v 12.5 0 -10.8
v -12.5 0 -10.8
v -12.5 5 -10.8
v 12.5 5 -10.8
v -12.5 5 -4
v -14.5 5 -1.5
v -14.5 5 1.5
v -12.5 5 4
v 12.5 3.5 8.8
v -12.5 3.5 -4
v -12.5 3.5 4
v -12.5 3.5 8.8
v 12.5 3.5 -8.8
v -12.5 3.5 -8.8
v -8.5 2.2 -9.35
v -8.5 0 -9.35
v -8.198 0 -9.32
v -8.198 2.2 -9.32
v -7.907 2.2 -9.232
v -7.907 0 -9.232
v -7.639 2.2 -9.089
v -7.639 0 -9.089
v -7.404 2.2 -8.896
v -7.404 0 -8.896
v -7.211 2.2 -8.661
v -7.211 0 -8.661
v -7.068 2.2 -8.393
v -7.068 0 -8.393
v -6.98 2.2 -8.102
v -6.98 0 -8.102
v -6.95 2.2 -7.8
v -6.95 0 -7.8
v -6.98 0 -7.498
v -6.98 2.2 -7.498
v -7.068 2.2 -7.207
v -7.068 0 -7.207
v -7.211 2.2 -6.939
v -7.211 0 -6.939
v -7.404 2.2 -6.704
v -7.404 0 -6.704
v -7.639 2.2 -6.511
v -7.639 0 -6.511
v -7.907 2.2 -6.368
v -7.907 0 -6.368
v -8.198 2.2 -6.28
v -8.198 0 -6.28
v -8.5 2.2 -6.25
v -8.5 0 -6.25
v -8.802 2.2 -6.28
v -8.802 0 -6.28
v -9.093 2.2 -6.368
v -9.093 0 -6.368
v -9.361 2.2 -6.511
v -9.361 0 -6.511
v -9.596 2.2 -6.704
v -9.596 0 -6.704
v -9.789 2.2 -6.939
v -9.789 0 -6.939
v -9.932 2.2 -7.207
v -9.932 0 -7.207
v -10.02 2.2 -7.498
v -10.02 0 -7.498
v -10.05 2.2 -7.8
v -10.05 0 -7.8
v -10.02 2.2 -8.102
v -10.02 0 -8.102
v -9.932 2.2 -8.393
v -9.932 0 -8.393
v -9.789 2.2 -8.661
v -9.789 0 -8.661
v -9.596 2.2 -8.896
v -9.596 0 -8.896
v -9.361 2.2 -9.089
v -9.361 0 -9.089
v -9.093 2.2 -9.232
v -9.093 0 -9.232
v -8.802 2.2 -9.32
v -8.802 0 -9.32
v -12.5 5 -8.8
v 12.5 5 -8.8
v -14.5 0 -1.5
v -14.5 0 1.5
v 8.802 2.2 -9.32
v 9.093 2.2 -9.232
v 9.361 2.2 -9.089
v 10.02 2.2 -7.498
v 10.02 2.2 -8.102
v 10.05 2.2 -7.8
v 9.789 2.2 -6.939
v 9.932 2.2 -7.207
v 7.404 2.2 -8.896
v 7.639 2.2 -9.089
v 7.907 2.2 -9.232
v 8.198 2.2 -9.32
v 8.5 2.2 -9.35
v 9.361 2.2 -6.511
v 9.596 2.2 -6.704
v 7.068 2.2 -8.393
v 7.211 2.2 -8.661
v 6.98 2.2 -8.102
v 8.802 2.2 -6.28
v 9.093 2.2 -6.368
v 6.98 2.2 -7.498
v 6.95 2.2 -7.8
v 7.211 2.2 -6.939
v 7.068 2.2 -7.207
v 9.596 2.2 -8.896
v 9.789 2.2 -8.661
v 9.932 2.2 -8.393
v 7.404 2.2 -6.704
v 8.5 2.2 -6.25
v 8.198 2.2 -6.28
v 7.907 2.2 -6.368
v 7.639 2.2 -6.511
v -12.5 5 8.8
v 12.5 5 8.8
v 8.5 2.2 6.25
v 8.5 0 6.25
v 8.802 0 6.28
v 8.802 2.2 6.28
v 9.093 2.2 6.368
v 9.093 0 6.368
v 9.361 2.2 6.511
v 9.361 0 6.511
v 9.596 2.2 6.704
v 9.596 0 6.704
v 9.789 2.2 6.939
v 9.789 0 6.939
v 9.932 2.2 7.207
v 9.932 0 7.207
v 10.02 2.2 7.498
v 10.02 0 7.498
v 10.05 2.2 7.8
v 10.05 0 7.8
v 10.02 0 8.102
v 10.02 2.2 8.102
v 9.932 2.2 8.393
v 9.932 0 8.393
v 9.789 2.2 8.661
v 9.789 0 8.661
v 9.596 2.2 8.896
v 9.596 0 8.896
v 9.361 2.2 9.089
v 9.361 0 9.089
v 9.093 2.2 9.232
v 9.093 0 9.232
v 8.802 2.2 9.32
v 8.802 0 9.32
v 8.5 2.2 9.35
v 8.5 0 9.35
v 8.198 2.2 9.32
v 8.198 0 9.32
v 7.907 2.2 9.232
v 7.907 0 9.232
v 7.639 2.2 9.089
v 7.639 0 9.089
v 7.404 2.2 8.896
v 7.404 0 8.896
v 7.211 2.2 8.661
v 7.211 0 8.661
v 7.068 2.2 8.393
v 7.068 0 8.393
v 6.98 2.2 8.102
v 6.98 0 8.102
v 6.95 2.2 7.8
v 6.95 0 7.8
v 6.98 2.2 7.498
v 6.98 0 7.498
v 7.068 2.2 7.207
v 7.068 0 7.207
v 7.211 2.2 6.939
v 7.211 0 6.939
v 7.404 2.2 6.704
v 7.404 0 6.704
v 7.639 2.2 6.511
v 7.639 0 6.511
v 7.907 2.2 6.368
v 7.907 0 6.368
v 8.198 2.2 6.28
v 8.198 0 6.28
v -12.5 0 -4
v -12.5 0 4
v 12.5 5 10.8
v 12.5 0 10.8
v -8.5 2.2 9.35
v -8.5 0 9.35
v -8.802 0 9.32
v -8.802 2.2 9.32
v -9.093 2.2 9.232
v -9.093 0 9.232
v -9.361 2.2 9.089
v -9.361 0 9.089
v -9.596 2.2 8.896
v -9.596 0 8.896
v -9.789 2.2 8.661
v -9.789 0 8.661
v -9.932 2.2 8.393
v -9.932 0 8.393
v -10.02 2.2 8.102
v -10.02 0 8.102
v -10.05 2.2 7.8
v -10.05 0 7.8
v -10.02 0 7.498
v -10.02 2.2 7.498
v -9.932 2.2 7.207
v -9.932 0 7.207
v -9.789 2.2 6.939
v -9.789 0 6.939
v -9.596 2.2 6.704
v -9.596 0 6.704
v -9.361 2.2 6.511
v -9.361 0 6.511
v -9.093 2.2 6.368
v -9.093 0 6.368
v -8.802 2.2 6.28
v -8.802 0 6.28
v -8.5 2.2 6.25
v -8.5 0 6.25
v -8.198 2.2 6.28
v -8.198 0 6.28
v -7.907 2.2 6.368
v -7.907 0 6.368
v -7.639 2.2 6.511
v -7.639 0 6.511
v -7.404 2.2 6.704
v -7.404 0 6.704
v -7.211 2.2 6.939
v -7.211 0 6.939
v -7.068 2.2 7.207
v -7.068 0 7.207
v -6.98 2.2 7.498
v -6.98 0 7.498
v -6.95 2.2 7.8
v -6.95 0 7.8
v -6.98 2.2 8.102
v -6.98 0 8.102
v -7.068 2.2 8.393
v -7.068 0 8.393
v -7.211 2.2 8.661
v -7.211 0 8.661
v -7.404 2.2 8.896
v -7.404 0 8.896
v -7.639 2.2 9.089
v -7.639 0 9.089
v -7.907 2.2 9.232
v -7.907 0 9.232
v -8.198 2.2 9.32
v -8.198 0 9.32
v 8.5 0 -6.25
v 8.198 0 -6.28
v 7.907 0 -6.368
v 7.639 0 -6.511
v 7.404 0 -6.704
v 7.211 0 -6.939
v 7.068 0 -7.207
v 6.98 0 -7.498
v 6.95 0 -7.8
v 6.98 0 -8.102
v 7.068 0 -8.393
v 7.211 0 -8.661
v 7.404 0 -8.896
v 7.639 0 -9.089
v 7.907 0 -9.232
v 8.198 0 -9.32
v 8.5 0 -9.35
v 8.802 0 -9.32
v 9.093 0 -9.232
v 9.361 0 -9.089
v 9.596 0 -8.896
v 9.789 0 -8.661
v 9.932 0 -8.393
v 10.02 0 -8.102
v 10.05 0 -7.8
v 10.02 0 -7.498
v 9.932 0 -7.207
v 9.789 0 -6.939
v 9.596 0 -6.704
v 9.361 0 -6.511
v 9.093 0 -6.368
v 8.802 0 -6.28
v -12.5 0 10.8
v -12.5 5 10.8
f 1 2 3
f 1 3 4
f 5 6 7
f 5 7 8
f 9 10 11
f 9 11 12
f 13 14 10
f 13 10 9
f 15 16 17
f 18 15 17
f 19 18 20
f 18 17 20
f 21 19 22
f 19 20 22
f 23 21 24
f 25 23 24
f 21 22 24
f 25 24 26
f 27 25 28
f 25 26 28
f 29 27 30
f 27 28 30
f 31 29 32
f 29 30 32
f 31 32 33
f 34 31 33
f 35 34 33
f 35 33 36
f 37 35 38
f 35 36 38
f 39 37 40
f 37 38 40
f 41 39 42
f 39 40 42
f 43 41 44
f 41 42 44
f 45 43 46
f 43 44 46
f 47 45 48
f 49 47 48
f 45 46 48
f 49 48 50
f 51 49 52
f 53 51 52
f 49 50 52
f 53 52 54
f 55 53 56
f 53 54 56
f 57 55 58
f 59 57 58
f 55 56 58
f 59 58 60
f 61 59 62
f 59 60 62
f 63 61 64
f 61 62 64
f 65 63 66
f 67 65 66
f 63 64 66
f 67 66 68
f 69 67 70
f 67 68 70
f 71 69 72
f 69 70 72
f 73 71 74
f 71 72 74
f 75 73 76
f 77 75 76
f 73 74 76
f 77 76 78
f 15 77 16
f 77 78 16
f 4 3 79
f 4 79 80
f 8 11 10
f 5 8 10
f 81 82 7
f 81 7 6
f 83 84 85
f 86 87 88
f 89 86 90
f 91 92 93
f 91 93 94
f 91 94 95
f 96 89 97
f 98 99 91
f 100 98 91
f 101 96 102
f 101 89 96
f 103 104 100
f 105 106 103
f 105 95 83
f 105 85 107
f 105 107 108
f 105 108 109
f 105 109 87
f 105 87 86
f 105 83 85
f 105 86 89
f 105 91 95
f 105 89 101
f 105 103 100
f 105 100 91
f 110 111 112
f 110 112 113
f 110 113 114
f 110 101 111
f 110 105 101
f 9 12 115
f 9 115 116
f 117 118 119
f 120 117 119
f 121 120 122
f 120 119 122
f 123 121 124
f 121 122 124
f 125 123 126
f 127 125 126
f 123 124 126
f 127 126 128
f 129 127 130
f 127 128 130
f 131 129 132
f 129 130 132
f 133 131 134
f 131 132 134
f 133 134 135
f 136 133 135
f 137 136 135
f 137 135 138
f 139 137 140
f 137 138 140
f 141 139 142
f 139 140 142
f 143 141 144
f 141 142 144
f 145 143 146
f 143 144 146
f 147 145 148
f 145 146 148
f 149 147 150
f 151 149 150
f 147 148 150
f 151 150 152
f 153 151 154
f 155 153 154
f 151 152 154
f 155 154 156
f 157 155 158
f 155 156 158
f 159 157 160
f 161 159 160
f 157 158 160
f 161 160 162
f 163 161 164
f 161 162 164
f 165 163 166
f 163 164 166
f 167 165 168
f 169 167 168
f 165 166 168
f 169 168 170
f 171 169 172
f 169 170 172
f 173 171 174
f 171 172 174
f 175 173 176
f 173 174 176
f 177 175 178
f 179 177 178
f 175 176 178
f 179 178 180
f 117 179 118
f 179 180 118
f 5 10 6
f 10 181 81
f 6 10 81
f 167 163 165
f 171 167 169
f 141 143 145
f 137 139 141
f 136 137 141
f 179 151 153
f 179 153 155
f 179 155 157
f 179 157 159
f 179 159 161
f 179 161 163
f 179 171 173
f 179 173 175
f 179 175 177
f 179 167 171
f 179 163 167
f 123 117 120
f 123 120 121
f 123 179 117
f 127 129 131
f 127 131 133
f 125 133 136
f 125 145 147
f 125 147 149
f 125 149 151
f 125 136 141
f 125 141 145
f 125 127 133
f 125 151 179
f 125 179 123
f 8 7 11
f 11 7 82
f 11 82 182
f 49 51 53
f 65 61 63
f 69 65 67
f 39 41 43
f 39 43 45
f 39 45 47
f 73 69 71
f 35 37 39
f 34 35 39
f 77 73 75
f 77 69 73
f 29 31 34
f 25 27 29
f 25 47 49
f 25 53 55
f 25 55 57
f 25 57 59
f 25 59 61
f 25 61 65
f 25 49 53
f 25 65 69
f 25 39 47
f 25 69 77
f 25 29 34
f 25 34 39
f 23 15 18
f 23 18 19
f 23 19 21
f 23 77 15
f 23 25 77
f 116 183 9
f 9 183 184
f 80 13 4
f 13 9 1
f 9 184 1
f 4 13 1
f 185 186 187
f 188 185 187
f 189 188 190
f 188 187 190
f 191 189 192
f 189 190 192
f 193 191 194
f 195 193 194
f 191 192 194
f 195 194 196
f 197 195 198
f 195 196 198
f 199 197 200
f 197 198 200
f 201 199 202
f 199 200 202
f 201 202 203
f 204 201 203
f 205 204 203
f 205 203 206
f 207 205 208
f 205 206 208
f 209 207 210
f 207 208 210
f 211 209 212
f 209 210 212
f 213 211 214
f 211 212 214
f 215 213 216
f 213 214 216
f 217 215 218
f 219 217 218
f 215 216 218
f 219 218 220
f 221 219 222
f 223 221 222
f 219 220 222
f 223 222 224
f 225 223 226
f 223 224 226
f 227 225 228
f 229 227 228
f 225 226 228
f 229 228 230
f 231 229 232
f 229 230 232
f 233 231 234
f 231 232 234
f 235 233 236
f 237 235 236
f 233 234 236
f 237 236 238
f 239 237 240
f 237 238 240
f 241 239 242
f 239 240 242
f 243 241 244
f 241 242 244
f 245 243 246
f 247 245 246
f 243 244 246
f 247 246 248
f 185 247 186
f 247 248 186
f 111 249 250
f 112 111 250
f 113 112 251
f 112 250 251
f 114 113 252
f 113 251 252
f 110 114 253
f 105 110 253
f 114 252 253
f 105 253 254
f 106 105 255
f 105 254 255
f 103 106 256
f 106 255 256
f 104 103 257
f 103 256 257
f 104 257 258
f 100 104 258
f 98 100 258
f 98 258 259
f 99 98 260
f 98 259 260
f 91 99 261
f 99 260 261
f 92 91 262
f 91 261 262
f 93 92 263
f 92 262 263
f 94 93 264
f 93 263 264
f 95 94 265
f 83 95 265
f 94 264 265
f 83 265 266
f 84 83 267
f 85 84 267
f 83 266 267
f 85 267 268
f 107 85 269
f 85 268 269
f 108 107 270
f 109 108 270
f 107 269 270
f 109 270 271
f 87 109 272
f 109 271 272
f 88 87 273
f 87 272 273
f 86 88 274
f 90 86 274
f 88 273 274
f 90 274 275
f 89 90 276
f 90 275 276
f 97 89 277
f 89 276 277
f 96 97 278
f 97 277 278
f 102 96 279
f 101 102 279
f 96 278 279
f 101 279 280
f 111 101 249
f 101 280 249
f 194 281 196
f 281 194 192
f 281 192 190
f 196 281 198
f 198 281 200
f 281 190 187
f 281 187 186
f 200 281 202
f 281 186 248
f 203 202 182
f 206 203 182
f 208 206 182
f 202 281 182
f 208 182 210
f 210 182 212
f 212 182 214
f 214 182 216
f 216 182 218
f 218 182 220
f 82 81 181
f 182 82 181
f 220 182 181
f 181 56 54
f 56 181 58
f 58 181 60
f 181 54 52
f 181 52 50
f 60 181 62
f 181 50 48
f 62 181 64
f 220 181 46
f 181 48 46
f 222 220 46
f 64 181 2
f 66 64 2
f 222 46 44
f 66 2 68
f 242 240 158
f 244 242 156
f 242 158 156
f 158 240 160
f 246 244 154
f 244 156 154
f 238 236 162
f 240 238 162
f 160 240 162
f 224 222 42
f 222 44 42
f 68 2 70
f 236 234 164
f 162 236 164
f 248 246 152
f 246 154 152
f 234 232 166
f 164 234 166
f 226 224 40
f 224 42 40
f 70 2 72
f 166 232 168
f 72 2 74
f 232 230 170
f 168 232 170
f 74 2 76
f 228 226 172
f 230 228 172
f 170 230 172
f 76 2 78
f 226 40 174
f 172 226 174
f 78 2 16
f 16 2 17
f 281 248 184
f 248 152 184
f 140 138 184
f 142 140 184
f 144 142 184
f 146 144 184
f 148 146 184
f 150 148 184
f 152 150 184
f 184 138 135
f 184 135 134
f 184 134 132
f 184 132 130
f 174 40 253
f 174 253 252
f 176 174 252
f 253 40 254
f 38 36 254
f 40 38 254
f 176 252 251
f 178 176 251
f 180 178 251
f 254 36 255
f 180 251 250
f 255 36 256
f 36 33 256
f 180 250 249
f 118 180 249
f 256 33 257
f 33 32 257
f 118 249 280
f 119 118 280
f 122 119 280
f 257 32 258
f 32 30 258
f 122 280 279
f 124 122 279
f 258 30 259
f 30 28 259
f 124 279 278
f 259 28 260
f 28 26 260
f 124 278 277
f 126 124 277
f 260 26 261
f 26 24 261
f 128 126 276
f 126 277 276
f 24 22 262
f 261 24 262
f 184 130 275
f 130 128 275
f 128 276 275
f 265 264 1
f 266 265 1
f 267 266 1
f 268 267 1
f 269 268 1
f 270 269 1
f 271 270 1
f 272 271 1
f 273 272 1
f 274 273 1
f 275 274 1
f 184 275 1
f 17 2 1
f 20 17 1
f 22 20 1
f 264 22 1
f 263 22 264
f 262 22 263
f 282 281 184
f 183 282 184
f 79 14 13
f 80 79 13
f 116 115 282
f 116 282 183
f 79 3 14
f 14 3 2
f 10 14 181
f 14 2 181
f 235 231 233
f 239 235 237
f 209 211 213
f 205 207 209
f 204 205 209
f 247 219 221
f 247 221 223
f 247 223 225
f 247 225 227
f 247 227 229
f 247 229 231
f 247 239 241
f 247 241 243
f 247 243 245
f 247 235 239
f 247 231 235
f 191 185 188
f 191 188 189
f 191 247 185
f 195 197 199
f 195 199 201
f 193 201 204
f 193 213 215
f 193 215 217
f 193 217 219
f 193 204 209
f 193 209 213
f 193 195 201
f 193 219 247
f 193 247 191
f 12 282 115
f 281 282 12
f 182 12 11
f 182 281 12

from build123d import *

# Parameters (mm, degrees)
RESSALTO_EXTRUS_O1_DEPTH = 3.5
ESBO_O1_3_W              = 25
ESBO_O1_3_H              = 2
RESSALTO_EXTRUS_O2_DEPTH = 5
ESBO_O2_R                = 1.55
CORTE_EXTRUS_O1_DEPTH    = 2.2


with BuildPart() as part:
    # Esboço1 → Ressalto-extrusão1 (new body)
    with BuildSketch(Plane(origin=(0, 0, 0), x_dir=(1, 0, 0), z_dir=(0, 1, 0))):
        Polygon((12.5, -8.8), (12.5, 8.8), (-12.5, 8.8), (-12.5, 4), (-12.5, 1.5), (-12.5, -1.5), (-12.5, -4), (-12.5, -8.8), align=None)
    extrude(amount=RESSALTO_EXTRUS_O1_DEPTH)

    # Esboço1<3> → Ressalto-extrusão2 (add)
    with BuildSketch(Plane(origin=(0, 0, 0), x_dir=(1, 0, 0), z_dir=(0, 1, 0))):
        with Locations((0, 9.8)):
            Rectangle(ESBO_O1_3_W, ESBO_O1_3_H)
        with Locations((0, -9.8)):
            Rectangle(ESBO_O1_3_W, ESBO_O1_3_H)
        Polygon((-12.5, 4), (-14.5, 1.5), (-14.5, -1.5), (-12.5, -4), align=None)
    extrude(amount=RESSALTO_EXTRUS_O2_DEPTH)

    # Esboço2 → Corte-extrusão1 (cut)
    with BuildSketch(Plane.XZ):
        with Locations((8.5, 7.8)):
            Circle(ESBO_O2_R)
        with Locations((-8.5, 7.8)):
            Circle(ESBO_O2_R)
        with Locations((-8.5, -7.8)):
            Circle(ESBO_O2_R)
        with Locations((8.5, -7.8)):
            Circle(ESBO_O2_R)
    extrude(amount=-CORTE_EXTRUS_O1_DEPTH, mode=Mode.SUBTRACT)


solid = part.part
